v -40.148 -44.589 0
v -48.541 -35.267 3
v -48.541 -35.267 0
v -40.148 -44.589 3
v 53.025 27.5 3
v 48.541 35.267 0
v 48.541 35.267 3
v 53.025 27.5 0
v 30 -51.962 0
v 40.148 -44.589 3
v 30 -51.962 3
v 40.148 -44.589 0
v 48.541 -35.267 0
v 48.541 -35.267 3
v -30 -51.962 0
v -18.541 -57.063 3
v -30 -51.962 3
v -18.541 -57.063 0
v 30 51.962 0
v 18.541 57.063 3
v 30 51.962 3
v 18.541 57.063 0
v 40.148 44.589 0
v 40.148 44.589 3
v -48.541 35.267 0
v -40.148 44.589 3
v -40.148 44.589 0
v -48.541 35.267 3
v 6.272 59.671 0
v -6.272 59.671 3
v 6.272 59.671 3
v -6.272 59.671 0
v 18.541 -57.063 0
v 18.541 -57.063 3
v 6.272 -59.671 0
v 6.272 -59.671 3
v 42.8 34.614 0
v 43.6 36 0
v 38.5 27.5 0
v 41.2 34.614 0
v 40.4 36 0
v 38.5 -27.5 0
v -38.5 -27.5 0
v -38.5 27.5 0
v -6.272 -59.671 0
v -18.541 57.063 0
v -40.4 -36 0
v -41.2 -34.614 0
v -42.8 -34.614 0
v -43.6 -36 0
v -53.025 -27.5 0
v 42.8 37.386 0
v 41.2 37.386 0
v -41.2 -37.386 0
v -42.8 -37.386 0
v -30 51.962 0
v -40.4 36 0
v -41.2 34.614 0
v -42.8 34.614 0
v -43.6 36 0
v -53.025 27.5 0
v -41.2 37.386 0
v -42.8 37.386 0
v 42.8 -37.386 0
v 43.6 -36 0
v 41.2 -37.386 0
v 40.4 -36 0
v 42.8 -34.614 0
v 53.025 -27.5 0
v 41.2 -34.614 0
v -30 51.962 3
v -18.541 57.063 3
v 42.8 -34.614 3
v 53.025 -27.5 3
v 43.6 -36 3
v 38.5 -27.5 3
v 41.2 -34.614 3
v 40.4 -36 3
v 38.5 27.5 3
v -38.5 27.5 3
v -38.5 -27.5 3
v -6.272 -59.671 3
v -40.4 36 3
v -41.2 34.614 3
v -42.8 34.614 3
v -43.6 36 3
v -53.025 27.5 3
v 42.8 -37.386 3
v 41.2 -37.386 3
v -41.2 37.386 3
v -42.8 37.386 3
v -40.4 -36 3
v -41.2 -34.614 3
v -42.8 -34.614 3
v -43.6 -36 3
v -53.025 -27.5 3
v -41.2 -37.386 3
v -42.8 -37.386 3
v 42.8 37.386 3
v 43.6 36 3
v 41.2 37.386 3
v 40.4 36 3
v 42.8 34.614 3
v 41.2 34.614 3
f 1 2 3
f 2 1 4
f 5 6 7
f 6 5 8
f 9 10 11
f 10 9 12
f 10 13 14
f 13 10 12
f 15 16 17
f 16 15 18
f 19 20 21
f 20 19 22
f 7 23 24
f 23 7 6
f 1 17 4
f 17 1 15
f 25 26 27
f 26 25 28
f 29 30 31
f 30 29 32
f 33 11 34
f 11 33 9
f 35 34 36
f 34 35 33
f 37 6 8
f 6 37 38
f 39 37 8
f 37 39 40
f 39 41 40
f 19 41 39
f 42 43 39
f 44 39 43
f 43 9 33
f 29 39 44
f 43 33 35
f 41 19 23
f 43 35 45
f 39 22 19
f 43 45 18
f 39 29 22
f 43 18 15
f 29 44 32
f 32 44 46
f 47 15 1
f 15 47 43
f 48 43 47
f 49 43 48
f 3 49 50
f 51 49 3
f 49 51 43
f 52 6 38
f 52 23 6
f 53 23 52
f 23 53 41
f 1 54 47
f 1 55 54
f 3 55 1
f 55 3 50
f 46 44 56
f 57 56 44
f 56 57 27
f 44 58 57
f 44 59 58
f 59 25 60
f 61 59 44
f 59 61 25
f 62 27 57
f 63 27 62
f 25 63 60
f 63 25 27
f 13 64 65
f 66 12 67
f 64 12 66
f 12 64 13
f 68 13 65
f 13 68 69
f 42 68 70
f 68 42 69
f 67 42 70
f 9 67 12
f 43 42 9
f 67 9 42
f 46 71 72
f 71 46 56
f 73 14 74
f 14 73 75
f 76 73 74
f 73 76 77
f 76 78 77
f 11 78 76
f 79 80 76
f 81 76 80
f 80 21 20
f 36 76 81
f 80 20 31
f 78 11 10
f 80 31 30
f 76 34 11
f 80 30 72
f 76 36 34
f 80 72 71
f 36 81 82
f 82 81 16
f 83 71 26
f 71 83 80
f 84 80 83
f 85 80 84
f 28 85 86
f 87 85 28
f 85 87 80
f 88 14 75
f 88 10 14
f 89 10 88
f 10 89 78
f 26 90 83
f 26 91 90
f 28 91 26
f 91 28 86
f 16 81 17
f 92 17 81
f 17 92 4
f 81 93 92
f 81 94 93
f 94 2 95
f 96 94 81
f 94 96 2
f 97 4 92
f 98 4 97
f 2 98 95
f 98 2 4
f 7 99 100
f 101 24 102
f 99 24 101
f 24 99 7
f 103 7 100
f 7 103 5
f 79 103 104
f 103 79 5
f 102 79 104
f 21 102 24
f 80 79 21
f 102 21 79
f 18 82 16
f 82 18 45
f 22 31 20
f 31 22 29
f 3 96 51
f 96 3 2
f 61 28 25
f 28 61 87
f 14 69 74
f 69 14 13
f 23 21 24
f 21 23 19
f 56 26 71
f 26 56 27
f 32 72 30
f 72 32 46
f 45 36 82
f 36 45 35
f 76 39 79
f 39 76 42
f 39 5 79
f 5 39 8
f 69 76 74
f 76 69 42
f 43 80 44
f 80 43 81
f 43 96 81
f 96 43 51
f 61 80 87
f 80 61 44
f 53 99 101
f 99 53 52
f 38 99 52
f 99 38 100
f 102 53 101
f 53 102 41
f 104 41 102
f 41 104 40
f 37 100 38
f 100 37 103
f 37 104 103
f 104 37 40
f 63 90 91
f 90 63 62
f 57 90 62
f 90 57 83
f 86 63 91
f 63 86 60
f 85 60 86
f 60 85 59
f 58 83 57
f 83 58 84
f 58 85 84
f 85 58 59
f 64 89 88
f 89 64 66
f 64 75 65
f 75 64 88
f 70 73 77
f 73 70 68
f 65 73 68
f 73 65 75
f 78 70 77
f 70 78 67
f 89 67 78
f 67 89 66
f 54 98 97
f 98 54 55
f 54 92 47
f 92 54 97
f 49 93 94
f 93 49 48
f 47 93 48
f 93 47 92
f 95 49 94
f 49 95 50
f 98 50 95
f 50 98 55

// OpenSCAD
difference(){
cylinder(d=120,h=3);
translate([38.5,-27.5,-1])cube(55);
scale([-1,1,1])translate([38.5,-27.5,-1])cube(55);
translate([42,36,-1])cylinder(d=3.2,h=5);    
translate([-42,36,-1])cylinder(d=3.2,h=5);    
translate([42,-36,-1])cylinder(d=3.2,h=5);    
translate([-42,-36,-1])cylinder(d=3.2,h=5);    
}
